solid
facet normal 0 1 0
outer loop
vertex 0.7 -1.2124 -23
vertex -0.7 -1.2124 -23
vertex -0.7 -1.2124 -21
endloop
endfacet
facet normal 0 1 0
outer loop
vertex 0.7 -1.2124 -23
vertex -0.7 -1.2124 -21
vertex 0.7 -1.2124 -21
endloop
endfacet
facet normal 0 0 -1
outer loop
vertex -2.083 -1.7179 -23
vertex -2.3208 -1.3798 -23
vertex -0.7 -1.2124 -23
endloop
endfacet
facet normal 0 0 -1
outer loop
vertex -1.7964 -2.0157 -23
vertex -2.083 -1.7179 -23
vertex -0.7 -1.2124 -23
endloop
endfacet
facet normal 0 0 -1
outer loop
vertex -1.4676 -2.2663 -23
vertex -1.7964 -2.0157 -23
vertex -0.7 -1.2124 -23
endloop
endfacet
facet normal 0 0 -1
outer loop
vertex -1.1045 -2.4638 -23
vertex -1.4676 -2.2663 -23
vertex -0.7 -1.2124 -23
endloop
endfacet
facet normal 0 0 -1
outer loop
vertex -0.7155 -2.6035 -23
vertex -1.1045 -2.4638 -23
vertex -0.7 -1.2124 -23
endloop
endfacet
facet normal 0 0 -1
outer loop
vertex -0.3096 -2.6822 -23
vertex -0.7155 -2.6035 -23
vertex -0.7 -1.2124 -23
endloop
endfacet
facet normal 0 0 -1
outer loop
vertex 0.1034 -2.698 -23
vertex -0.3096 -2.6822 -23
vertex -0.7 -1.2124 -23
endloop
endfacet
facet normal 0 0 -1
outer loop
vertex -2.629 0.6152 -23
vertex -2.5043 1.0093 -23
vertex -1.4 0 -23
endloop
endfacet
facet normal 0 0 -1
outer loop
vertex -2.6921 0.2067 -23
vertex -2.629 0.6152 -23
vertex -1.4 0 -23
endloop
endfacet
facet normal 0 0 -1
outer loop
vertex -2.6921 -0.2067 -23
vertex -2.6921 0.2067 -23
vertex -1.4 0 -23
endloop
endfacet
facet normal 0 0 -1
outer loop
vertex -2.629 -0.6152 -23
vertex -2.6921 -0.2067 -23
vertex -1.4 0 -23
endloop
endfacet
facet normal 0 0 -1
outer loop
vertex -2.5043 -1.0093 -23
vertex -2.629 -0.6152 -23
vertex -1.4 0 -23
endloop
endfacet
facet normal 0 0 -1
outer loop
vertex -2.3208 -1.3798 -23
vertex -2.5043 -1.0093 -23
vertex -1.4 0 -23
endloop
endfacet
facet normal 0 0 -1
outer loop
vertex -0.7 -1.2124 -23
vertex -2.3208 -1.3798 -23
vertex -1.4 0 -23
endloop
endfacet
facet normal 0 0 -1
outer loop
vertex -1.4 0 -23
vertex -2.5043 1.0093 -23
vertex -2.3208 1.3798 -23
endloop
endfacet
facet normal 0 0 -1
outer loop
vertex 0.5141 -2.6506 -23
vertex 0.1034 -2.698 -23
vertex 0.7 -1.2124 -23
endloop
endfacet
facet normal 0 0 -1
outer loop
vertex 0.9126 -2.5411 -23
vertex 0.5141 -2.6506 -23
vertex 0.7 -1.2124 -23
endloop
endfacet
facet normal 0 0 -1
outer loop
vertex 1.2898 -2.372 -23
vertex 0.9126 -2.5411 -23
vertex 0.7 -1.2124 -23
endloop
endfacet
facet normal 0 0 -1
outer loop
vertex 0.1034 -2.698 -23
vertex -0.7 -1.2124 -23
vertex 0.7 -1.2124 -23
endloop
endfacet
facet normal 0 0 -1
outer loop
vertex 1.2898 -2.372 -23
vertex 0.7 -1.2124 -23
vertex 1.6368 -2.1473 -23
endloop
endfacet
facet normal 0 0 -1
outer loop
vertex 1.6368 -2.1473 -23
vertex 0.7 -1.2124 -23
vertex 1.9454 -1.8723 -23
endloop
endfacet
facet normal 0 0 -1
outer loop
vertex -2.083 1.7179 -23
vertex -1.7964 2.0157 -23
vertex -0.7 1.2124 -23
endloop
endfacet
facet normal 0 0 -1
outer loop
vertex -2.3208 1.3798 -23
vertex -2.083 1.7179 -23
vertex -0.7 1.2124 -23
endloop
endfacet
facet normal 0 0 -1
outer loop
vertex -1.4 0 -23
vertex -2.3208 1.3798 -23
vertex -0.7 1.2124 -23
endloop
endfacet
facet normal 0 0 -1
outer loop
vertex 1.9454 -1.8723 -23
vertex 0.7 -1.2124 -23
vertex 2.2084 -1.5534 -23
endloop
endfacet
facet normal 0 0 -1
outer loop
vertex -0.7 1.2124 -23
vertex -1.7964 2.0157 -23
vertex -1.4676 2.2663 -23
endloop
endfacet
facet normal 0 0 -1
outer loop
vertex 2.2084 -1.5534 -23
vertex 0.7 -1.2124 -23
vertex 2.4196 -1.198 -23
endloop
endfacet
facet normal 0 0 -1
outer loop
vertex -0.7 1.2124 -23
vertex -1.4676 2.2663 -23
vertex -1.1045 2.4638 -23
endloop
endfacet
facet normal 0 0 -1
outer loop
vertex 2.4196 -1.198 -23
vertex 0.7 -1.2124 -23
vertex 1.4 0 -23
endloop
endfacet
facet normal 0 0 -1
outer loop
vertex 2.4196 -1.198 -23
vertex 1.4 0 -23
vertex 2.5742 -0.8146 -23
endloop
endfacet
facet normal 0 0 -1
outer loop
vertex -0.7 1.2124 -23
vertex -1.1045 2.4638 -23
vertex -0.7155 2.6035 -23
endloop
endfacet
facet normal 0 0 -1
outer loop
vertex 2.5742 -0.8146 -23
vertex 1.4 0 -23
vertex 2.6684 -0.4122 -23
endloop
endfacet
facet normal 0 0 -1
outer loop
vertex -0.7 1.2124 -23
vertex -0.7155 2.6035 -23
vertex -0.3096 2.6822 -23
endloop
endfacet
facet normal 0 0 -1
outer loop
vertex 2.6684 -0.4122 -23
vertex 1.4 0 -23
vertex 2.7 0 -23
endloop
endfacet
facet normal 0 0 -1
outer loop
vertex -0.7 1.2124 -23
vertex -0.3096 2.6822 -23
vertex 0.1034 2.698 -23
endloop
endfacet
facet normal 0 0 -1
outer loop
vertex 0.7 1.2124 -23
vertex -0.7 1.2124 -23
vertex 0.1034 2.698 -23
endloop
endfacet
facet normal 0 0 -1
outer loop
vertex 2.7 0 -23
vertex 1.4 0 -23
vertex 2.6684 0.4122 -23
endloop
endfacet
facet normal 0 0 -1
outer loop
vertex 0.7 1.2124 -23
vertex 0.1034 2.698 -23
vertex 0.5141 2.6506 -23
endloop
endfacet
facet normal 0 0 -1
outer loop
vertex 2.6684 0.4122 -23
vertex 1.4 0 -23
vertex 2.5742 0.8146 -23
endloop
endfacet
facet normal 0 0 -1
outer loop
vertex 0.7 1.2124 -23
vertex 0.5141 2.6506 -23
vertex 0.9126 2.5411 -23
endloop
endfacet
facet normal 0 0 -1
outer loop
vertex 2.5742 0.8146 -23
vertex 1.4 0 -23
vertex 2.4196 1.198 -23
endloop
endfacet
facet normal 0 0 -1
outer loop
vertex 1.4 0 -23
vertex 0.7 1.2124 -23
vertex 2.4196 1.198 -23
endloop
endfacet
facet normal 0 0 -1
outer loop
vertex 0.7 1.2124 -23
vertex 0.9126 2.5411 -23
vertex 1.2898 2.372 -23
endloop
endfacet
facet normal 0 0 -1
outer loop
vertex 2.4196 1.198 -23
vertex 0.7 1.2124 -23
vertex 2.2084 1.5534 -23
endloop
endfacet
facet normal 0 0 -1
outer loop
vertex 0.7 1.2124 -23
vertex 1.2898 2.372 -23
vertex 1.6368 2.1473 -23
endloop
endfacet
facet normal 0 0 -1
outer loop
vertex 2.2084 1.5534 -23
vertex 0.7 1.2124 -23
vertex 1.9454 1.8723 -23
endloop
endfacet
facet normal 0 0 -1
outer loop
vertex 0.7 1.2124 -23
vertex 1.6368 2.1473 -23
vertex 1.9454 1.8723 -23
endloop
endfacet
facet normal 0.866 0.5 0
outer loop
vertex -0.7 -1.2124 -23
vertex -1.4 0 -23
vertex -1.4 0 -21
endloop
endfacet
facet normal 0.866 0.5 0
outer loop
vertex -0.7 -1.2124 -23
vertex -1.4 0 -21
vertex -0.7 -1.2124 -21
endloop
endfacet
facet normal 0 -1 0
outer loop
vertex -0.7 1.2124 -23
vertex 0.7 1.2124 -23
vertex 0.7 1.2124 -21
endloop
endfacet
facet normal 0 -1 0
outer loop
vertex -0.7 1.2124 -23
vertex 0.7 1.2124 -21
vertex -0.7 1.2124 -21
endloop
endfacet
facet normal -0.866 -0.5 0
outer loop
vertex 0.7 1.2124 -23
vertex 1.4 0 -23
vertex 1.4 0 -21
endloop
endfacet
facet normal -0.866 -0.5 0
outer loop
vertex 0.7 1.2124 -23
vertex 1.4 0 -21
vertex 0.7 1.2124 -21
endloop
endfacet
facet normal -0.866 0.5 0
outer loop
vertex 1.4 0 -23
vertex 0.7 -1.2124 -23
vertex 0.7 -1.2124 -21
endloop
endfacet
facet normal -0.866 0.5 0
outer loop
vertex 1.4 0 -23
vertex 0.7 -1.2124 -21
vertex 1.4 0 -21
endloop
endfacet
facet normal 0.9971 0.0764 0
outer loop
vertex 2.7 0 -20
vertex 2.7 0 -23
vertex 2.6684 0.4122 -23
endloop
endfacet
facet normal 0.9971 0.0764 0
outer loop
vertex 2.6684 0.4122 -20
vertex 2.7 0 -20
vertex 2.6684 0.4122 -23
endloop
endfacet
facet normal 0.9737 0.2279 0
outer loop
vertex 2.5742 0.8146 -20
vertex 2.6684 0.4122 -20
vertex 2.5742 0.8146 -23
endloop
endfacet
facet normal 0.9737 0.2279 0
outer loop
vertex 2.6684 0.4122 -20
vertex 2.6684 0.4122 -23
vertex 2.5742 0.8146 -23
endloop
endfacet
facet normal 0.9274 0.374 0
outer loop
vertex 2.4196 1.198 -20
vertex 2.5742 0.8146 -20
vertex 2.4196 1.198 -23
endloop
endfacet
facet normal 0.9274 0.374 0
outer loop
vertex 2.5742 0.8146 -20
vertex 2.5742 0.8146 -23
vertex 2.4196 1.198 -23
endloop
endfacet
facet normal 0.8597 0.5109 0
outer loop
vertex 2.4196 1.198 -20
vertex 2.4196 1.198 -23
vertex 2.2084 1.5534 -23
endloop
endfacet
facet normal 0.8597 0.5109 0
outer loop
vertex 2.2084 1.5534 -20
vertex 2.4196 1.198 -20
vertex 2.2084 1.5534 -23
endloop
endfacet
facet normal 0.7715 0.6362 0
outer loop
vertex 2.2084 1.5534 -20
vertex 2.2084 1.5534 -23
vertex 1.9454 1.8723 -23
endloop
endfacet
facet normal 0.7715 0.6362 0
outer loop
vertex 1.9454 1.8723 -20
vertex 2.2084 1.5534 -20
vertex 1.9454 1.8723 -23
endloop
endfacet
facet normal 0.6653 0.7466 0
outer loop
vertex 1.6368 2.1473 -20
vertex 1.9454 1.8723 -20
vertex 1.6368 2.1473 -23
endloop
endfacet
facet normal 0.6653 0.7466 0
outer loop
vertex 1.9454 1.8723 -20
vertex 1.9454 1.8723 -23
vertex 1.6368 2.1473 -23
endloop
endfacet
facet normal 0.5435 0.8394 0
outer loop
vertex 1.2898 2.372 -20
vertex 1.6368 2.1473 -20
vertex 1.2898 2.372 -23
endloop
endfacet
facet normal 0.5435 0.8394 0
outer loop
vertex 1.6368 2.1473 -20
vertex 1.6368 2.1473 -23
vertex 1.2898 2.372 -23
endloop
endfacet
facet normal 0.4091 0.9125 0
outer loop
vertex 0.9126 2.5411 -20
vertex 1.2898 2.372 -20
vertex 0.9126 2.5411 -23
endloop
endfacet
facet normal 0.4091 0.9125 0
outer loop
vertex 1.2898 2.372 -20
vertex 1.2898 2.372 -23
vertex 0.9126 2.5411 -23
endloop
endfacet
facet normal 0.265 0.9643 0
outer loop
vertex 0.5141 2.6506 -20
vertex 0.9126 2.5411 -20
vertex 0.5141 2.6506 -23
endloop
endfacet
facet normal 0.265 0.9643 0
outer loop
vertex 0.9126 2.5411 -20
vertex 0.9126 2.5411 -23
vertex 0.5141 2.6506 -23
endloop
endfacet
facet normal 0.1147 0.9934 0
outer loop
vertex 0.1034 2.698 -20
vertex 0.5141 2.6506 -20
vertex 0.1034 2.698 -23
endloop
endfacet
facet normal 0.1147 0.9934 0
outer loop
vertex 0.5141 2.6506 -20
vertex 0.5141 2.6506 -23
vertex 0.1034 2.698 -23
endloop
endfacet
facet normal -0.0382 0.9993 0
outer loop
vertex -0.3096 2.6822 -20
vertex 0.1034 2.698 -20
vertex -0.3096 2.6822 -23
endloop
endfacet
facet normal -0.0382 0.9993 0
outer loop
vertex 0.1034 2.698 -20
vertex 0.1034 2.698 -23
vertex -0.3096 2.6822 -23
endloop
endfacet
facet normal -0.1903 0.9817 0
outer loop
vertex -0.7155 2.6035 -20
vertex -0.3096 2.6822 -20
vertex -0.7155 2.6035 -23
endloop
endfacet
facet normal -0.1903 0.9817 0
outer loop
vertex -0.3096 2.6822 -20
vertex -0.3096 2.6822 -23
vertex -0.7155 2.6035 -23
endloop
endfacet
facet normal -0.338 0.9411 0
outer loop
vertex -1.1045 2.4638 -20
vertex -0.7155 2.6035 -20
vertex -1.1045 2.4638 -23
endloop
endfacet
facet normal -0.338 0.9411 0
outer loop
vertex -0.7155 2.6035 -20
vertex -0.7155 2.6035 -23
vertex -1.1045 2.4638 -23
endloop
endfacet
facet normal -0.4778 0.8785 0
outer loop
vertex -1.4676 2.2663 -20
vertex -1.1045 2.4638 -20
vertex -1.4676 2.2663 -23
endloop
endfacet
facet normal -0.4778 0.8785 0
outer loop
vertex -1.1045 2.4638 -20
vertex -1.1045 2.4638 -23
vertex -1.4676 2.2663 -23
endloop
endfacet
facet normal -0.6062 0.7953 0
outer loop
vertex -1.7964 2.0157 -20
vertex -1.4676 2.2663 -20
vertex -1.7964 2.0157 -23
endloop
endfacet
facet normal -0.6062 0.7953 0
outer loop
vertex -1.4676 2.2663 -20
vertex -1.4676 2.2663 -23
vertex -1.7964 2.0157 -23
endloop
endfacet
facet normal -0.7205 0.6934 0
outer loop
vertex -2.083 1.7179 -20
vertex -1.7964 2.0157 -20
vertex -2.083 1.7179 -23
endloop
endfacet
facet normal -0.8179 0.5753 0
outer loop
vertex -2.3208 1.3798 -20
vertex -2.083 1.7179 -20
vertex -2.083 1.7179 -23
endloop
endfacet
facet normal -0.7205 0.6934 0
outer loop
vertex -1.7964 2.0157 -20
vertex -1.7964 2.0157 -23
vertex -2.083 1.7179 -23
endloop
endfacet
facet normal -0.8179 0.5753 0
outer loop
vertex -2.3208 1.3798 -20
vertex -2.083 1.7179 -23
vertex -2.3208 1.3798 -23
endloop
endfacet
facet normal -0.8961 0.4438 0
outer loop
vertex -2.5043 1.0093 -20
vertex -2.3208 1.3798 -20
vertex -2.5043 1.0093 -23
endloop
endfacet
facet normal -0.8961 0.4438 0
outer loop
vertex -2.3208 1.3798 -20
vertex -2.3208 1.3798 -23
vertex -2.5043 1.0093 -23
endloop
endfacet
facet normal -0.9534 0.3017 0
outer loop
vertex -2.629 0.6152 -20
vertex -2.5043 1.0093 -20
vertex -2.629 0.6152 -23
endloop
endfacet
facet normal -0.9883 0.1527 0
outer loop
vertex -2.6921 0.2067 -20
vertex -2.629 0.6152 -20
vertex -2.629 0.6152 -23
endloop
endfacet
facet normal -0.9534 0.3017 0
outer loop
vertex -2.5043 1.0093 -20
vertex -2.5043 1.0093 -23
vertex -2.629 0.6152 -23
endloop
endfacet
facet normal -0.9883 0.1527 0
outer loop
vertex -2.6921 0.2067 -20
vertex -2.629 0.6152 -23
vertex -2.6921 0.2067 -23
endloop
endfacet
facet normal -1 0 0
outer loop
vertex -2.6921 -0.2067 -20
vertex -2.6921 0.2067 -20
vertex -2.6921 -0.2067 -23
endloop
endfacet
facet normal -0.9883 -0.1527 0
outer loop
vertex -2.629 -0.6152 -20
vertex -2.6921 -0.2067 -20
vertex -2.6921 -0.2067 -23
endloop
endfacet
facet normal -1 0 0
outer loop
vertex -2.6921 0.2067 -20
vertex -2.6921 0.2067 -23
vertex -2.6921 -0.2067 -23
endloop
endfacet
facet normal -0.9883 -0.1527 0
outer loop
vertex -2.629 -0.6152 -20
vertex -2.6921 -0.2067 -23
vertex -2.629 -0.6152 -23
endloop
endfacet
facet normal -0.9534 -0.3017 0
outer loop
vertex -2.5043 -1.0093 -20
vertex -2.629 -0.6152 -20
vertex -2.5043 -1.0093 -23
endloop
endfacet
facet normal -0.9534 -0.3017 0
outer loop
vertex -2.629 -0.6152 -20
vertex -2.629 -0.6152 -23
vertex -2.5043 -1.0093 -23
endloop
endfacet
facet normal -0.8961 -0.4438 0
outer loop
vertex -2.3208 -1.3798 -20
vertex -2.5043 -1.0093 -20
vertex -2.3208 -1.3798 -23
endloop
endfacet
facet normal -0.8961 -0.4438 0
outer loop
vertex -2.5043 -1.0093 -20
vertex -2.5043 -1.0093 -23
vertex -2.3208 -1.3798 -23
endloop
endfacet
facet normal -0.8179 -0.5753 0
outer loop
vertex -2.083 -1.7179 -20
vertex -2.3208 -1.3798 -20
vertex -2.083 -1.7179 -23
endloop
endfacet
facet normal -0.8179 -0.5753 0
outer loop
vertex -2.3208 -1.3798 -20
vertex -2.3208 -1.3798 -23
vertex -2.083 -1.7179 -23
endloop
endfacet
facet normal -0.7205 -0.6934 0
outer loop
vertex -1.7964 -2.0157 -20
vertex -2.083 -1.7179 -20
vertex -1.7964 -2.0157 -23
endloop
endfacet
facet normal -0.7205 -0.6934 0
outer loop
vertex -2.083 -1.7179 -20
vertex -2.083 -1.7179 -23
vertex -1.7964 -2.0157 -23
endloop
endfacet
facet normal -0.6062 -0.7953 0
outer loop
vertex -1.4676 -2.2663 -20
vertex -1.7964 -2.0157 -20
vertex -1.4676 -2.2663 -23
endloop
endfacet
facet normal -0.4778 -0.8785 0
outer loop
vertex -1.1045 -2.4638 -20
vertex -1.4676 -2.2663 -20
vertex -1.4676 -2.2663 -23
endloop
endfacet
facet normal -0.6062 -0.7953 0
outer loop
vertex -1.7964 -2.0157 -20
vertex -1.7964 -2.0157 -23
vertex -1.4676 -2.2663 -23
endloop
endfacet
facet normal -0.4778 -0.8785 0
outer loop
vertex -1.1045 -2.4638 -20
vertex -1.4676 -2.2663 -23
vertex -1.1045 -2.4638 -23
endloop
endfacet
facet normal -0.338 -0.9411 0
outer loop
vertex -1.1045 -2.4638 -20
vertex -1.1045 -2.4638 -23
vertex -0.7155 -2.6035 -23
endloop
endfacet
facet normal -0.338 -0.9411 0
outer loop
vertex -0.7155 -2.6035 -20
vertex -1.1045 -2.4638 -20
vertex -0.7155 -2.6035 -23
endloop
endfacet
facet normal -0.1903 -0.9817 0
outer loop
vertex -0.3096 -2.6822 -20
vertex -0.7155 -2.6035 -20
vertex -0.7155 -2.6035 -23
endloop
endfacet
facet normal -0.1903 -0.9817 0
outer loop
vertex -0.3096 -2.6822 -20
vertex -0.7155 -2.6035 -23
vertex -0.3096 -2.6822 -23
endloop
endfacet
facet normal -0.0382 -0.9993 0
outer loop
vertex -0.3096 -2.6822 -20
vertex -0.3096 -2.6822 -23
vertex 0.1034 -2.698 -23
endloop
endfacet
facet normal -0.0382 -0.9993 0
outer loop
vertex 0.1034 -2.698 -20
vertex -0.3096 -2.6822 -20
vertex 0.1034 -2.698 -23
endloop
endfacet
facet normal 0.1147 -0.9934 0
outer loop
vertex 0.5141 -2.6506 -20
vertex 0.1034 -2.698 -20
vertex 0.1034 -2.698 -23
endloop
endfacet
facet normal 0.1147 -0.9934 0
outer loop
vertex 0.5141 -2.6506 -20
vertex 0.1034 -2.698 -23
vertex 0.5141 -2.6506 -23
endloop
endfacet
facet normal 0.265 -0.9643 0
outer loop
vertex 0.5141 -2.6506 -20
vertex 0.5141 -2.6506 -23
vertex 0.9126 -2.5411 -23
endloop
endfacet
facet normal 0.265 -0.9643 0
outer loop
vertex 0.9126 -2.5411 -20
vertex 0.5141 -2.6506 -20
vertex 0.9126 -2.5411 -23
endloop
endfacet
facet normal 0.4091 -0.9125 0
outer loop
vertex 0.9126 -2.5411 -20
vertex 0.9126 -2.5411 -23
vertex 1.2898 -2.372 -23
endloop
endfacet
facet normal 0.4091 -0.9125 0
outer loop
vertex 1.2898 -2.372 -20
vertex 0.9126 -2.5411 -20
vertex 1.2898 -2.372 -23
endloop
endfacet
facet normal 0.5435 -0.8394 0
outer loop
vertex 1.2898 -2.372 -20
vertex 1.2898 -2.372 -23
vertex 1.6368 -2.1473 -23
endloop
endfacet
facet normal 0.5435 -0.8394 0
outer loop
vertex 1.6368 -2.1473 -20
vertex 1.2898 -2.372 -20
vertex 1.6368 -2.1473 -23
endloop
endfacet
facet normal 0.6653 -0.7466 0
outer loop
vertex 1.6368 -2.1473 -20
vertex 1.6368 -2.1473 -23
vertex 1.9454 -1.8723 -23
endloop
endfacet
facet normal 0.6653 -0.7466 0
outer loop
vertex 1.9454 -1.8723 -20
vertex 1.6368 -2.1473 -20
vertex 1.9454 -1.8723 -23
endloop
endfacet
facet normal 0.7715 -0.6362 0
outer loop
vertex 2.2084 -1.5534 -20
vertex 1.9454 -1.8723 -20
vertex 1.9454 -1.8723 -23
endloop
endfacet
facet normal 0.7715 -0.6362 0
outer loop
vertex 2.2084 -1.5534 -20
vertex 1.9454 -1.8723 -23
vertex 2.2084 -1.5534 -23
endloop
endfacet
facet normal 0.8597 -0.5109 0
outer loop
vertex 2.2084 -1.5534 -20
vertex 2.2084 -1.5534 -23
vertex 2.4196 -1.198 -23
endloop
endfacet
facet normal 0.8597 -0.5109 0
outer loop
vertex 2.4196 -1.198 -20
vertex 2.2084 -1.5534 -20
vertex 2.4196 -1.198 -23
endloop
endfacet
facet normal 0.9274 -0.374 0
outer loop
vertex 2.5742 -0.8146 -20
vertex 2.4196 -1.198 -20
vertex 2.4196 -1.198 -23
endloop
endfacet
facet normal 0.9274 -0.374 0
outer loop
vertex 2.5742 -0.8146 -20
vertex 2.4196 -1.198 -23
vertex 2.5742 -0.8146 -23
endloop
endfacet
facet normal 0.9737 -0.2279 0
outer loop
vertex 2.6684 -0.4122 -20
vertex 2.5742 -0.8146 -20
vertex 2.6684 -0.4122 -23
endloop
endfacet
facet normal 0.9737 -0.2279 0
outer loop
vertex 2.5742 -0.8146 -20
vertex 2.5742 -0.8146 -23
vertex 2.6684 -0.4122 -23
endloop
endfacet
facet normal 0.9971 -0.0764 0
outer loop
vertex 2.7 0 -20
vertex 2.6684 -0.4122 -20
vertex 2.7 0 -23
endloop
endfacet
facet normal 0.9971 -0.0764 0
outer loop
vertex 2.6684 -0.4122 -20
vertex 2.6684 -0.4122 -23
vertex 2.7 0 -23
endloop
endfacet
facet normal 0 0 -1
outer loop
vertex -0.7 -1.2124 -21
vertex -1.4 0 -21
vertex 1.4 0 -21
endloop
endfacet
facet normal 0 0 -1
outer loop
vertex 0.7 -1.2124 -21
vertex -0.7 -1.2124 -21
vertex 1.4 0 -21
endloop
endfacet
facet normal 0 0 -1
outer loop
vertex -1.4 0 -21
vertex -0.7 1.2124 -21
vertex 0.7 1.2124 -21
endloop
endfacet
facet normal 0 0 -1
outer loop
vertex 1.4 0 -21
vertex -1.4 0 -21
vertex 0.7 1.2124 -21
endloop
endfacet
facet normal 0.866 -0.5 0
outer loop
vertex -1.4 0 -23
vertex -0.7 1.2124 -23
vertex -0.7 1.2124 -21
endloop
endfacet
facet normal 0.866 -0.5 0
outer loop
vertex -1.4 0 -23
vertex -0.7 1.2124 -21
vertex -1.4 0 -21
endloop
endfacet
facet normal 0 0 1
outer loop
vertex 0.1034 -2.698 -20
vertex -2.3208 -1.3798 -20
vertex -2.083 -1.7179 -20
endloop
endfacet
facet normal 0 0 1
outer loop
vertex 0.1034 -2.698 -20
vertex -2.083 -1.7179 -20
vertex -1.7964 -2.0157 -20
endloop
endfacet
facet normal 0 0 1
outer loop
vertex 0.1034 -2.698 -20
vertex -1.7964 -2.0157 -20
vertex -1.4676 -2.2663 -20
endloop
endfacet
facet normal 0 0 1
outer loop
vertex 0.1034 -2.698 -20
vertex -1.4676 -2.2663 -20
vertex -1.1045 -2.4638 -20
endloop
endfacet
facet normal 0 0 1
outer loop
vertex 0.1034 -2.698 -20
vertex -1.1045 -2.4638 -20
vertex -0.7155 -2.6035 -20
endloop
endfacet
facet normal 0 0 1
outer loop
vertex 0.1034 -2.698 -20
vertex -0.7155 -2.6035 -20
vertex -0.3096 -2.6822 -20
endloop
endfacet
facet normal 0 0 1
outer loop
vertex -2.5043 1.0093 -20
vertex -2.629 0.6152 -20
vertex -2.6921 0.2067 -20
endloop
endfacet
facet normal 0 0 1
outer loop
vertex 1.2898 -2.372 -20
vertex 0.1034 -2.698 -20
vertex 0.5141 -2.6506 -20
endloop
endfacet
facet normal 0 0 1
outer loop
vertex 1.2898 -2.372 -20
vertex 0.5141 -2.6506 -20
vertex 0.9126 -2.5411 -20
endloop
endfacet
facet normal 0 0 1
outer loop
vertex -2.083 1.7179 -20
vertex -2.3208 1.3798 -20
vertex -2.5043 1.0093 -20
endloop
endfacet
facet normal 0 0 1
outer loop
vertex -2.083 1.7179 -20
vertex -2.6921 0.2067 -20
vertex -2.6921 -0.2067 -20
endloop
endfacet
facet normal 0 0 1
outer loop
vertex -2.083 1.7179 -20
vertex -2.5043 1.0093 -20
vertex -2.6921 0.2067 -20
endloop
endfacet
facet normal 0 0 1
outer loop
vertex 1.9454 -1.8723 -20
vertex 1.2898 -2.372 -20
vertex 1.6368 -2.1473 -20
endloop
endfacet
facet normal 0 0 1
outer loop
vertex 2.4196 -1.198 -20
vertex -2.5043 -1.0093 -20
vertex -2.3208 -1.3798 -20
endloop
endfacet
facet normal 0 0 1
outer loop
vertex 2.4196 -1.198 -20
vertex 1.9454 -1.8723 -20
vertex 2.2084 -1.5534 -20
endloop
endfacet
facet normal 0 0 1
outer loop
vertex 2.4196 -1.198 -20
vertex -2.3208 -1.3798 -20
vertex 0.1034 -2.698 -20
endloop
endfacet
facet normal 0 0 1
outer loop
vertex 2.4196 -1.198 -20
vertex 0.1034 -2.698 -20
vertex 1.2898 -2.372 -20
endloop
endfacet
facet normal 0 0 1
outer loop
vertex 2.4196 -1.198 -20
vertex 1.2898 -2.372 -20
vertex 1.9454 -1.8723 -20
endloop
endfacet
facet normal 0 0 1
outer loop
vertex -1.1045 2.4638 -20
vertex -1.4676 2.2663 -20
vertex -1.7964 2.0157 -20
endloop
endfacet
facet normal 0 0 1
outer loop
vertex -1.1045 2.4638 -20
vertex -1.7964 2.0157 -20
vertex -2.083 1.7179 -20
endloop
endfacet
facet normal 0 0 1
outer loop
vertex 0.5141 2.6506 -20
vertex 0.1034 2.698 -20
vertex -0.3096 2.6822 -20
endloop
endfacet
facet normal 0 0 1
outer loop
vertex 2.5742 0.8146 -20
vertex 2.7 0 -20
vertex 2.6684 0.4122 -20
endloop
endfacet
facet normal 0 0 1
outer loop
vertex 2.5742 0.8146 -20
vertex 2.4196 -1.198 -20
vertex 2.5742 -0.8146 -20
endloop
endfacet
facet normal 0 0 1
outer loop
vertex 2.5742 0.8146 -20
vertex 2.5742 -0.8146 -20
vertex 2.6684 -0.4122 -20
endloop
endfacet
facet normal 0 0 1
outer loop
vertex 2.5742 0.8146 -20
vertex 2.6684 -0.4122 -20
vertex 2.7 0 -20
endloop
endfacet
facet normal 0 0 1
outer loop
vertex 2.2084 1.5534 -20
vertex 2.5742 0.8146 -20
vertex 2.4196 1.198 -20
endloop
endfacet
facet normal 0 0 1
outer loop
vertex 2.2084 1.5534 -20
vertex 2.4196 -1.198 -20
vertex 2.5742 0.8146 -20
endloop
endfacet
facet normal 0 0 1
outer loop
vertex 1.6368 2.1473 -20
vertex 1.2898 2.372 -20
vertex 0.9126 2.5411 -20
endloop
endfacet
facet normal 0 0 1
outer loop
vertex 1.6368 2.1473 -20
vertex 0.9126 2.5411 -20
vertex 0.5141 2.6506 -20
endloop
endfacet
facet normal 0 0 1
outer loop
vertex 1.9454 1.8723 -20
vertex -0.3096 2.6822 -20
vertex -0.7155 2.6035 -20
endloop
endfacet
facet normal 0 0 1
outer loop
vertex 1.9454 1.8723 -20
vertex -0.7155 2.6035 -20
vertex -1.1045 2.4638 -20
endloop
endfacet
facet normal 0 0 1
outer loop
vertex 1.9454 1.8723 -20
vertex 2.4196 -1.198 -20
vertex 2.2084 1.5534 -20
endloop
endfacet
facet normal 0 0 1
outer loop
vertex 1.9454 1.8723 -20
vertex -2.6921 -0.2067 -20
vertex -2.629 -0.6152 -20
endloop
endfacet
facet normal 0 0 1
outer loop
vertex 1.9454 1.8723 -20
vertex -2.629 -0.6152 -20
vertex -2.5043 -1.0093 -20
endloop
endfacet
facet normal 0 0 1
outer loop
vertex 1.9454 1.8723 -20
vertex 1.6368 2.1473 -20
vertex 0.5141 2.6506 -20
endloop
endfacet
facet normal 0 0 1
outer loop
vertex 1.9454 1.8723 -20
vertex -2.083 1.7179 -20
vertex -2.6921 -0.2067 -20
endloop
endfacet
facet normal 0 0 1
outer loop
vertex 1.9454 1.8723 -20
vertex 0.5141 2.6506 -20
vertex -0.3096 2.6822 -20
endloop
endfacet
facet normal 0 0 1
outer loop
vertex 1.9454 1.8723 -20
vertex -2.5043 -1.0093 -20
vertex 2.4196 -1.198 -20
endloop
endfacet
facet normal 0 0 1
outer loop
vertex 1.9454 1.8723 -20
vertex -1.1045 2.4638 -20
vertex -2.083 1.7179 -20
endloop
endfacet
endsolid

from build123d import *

# Parameters (mm, degrees)
PRISM_DEPTH       = 2
CYLINDER013_R     = 2.7
CYLINDER013_DEPTH = 3


with BuildPart() as prism:
    # Prism → Prism (new body)
    with BuildSketch(Plane.XY.offset(-23)):
        Polygon((1.4, 0), (0.7, 1.212436), (-0.7, 1.212436), (-1.4, 0), (-0.7, -1.212436), (0.7, -1.212436), align=None)
    extrude(amount=PRISM_DEPTH)


with BuildPart() as cut008:
    # Cylinder013 → Cylinder013 (new body)
    with BuildSketch(Plane.XY.offset(-23)):
        Circle(CYLINDER013_R)
    extrude(amount=CYLINDER013_DEPTH)

    # Cut008: cut Prism
    add(prism.part, mode=Mode.SUBTRACT)


solid = cut008.part
